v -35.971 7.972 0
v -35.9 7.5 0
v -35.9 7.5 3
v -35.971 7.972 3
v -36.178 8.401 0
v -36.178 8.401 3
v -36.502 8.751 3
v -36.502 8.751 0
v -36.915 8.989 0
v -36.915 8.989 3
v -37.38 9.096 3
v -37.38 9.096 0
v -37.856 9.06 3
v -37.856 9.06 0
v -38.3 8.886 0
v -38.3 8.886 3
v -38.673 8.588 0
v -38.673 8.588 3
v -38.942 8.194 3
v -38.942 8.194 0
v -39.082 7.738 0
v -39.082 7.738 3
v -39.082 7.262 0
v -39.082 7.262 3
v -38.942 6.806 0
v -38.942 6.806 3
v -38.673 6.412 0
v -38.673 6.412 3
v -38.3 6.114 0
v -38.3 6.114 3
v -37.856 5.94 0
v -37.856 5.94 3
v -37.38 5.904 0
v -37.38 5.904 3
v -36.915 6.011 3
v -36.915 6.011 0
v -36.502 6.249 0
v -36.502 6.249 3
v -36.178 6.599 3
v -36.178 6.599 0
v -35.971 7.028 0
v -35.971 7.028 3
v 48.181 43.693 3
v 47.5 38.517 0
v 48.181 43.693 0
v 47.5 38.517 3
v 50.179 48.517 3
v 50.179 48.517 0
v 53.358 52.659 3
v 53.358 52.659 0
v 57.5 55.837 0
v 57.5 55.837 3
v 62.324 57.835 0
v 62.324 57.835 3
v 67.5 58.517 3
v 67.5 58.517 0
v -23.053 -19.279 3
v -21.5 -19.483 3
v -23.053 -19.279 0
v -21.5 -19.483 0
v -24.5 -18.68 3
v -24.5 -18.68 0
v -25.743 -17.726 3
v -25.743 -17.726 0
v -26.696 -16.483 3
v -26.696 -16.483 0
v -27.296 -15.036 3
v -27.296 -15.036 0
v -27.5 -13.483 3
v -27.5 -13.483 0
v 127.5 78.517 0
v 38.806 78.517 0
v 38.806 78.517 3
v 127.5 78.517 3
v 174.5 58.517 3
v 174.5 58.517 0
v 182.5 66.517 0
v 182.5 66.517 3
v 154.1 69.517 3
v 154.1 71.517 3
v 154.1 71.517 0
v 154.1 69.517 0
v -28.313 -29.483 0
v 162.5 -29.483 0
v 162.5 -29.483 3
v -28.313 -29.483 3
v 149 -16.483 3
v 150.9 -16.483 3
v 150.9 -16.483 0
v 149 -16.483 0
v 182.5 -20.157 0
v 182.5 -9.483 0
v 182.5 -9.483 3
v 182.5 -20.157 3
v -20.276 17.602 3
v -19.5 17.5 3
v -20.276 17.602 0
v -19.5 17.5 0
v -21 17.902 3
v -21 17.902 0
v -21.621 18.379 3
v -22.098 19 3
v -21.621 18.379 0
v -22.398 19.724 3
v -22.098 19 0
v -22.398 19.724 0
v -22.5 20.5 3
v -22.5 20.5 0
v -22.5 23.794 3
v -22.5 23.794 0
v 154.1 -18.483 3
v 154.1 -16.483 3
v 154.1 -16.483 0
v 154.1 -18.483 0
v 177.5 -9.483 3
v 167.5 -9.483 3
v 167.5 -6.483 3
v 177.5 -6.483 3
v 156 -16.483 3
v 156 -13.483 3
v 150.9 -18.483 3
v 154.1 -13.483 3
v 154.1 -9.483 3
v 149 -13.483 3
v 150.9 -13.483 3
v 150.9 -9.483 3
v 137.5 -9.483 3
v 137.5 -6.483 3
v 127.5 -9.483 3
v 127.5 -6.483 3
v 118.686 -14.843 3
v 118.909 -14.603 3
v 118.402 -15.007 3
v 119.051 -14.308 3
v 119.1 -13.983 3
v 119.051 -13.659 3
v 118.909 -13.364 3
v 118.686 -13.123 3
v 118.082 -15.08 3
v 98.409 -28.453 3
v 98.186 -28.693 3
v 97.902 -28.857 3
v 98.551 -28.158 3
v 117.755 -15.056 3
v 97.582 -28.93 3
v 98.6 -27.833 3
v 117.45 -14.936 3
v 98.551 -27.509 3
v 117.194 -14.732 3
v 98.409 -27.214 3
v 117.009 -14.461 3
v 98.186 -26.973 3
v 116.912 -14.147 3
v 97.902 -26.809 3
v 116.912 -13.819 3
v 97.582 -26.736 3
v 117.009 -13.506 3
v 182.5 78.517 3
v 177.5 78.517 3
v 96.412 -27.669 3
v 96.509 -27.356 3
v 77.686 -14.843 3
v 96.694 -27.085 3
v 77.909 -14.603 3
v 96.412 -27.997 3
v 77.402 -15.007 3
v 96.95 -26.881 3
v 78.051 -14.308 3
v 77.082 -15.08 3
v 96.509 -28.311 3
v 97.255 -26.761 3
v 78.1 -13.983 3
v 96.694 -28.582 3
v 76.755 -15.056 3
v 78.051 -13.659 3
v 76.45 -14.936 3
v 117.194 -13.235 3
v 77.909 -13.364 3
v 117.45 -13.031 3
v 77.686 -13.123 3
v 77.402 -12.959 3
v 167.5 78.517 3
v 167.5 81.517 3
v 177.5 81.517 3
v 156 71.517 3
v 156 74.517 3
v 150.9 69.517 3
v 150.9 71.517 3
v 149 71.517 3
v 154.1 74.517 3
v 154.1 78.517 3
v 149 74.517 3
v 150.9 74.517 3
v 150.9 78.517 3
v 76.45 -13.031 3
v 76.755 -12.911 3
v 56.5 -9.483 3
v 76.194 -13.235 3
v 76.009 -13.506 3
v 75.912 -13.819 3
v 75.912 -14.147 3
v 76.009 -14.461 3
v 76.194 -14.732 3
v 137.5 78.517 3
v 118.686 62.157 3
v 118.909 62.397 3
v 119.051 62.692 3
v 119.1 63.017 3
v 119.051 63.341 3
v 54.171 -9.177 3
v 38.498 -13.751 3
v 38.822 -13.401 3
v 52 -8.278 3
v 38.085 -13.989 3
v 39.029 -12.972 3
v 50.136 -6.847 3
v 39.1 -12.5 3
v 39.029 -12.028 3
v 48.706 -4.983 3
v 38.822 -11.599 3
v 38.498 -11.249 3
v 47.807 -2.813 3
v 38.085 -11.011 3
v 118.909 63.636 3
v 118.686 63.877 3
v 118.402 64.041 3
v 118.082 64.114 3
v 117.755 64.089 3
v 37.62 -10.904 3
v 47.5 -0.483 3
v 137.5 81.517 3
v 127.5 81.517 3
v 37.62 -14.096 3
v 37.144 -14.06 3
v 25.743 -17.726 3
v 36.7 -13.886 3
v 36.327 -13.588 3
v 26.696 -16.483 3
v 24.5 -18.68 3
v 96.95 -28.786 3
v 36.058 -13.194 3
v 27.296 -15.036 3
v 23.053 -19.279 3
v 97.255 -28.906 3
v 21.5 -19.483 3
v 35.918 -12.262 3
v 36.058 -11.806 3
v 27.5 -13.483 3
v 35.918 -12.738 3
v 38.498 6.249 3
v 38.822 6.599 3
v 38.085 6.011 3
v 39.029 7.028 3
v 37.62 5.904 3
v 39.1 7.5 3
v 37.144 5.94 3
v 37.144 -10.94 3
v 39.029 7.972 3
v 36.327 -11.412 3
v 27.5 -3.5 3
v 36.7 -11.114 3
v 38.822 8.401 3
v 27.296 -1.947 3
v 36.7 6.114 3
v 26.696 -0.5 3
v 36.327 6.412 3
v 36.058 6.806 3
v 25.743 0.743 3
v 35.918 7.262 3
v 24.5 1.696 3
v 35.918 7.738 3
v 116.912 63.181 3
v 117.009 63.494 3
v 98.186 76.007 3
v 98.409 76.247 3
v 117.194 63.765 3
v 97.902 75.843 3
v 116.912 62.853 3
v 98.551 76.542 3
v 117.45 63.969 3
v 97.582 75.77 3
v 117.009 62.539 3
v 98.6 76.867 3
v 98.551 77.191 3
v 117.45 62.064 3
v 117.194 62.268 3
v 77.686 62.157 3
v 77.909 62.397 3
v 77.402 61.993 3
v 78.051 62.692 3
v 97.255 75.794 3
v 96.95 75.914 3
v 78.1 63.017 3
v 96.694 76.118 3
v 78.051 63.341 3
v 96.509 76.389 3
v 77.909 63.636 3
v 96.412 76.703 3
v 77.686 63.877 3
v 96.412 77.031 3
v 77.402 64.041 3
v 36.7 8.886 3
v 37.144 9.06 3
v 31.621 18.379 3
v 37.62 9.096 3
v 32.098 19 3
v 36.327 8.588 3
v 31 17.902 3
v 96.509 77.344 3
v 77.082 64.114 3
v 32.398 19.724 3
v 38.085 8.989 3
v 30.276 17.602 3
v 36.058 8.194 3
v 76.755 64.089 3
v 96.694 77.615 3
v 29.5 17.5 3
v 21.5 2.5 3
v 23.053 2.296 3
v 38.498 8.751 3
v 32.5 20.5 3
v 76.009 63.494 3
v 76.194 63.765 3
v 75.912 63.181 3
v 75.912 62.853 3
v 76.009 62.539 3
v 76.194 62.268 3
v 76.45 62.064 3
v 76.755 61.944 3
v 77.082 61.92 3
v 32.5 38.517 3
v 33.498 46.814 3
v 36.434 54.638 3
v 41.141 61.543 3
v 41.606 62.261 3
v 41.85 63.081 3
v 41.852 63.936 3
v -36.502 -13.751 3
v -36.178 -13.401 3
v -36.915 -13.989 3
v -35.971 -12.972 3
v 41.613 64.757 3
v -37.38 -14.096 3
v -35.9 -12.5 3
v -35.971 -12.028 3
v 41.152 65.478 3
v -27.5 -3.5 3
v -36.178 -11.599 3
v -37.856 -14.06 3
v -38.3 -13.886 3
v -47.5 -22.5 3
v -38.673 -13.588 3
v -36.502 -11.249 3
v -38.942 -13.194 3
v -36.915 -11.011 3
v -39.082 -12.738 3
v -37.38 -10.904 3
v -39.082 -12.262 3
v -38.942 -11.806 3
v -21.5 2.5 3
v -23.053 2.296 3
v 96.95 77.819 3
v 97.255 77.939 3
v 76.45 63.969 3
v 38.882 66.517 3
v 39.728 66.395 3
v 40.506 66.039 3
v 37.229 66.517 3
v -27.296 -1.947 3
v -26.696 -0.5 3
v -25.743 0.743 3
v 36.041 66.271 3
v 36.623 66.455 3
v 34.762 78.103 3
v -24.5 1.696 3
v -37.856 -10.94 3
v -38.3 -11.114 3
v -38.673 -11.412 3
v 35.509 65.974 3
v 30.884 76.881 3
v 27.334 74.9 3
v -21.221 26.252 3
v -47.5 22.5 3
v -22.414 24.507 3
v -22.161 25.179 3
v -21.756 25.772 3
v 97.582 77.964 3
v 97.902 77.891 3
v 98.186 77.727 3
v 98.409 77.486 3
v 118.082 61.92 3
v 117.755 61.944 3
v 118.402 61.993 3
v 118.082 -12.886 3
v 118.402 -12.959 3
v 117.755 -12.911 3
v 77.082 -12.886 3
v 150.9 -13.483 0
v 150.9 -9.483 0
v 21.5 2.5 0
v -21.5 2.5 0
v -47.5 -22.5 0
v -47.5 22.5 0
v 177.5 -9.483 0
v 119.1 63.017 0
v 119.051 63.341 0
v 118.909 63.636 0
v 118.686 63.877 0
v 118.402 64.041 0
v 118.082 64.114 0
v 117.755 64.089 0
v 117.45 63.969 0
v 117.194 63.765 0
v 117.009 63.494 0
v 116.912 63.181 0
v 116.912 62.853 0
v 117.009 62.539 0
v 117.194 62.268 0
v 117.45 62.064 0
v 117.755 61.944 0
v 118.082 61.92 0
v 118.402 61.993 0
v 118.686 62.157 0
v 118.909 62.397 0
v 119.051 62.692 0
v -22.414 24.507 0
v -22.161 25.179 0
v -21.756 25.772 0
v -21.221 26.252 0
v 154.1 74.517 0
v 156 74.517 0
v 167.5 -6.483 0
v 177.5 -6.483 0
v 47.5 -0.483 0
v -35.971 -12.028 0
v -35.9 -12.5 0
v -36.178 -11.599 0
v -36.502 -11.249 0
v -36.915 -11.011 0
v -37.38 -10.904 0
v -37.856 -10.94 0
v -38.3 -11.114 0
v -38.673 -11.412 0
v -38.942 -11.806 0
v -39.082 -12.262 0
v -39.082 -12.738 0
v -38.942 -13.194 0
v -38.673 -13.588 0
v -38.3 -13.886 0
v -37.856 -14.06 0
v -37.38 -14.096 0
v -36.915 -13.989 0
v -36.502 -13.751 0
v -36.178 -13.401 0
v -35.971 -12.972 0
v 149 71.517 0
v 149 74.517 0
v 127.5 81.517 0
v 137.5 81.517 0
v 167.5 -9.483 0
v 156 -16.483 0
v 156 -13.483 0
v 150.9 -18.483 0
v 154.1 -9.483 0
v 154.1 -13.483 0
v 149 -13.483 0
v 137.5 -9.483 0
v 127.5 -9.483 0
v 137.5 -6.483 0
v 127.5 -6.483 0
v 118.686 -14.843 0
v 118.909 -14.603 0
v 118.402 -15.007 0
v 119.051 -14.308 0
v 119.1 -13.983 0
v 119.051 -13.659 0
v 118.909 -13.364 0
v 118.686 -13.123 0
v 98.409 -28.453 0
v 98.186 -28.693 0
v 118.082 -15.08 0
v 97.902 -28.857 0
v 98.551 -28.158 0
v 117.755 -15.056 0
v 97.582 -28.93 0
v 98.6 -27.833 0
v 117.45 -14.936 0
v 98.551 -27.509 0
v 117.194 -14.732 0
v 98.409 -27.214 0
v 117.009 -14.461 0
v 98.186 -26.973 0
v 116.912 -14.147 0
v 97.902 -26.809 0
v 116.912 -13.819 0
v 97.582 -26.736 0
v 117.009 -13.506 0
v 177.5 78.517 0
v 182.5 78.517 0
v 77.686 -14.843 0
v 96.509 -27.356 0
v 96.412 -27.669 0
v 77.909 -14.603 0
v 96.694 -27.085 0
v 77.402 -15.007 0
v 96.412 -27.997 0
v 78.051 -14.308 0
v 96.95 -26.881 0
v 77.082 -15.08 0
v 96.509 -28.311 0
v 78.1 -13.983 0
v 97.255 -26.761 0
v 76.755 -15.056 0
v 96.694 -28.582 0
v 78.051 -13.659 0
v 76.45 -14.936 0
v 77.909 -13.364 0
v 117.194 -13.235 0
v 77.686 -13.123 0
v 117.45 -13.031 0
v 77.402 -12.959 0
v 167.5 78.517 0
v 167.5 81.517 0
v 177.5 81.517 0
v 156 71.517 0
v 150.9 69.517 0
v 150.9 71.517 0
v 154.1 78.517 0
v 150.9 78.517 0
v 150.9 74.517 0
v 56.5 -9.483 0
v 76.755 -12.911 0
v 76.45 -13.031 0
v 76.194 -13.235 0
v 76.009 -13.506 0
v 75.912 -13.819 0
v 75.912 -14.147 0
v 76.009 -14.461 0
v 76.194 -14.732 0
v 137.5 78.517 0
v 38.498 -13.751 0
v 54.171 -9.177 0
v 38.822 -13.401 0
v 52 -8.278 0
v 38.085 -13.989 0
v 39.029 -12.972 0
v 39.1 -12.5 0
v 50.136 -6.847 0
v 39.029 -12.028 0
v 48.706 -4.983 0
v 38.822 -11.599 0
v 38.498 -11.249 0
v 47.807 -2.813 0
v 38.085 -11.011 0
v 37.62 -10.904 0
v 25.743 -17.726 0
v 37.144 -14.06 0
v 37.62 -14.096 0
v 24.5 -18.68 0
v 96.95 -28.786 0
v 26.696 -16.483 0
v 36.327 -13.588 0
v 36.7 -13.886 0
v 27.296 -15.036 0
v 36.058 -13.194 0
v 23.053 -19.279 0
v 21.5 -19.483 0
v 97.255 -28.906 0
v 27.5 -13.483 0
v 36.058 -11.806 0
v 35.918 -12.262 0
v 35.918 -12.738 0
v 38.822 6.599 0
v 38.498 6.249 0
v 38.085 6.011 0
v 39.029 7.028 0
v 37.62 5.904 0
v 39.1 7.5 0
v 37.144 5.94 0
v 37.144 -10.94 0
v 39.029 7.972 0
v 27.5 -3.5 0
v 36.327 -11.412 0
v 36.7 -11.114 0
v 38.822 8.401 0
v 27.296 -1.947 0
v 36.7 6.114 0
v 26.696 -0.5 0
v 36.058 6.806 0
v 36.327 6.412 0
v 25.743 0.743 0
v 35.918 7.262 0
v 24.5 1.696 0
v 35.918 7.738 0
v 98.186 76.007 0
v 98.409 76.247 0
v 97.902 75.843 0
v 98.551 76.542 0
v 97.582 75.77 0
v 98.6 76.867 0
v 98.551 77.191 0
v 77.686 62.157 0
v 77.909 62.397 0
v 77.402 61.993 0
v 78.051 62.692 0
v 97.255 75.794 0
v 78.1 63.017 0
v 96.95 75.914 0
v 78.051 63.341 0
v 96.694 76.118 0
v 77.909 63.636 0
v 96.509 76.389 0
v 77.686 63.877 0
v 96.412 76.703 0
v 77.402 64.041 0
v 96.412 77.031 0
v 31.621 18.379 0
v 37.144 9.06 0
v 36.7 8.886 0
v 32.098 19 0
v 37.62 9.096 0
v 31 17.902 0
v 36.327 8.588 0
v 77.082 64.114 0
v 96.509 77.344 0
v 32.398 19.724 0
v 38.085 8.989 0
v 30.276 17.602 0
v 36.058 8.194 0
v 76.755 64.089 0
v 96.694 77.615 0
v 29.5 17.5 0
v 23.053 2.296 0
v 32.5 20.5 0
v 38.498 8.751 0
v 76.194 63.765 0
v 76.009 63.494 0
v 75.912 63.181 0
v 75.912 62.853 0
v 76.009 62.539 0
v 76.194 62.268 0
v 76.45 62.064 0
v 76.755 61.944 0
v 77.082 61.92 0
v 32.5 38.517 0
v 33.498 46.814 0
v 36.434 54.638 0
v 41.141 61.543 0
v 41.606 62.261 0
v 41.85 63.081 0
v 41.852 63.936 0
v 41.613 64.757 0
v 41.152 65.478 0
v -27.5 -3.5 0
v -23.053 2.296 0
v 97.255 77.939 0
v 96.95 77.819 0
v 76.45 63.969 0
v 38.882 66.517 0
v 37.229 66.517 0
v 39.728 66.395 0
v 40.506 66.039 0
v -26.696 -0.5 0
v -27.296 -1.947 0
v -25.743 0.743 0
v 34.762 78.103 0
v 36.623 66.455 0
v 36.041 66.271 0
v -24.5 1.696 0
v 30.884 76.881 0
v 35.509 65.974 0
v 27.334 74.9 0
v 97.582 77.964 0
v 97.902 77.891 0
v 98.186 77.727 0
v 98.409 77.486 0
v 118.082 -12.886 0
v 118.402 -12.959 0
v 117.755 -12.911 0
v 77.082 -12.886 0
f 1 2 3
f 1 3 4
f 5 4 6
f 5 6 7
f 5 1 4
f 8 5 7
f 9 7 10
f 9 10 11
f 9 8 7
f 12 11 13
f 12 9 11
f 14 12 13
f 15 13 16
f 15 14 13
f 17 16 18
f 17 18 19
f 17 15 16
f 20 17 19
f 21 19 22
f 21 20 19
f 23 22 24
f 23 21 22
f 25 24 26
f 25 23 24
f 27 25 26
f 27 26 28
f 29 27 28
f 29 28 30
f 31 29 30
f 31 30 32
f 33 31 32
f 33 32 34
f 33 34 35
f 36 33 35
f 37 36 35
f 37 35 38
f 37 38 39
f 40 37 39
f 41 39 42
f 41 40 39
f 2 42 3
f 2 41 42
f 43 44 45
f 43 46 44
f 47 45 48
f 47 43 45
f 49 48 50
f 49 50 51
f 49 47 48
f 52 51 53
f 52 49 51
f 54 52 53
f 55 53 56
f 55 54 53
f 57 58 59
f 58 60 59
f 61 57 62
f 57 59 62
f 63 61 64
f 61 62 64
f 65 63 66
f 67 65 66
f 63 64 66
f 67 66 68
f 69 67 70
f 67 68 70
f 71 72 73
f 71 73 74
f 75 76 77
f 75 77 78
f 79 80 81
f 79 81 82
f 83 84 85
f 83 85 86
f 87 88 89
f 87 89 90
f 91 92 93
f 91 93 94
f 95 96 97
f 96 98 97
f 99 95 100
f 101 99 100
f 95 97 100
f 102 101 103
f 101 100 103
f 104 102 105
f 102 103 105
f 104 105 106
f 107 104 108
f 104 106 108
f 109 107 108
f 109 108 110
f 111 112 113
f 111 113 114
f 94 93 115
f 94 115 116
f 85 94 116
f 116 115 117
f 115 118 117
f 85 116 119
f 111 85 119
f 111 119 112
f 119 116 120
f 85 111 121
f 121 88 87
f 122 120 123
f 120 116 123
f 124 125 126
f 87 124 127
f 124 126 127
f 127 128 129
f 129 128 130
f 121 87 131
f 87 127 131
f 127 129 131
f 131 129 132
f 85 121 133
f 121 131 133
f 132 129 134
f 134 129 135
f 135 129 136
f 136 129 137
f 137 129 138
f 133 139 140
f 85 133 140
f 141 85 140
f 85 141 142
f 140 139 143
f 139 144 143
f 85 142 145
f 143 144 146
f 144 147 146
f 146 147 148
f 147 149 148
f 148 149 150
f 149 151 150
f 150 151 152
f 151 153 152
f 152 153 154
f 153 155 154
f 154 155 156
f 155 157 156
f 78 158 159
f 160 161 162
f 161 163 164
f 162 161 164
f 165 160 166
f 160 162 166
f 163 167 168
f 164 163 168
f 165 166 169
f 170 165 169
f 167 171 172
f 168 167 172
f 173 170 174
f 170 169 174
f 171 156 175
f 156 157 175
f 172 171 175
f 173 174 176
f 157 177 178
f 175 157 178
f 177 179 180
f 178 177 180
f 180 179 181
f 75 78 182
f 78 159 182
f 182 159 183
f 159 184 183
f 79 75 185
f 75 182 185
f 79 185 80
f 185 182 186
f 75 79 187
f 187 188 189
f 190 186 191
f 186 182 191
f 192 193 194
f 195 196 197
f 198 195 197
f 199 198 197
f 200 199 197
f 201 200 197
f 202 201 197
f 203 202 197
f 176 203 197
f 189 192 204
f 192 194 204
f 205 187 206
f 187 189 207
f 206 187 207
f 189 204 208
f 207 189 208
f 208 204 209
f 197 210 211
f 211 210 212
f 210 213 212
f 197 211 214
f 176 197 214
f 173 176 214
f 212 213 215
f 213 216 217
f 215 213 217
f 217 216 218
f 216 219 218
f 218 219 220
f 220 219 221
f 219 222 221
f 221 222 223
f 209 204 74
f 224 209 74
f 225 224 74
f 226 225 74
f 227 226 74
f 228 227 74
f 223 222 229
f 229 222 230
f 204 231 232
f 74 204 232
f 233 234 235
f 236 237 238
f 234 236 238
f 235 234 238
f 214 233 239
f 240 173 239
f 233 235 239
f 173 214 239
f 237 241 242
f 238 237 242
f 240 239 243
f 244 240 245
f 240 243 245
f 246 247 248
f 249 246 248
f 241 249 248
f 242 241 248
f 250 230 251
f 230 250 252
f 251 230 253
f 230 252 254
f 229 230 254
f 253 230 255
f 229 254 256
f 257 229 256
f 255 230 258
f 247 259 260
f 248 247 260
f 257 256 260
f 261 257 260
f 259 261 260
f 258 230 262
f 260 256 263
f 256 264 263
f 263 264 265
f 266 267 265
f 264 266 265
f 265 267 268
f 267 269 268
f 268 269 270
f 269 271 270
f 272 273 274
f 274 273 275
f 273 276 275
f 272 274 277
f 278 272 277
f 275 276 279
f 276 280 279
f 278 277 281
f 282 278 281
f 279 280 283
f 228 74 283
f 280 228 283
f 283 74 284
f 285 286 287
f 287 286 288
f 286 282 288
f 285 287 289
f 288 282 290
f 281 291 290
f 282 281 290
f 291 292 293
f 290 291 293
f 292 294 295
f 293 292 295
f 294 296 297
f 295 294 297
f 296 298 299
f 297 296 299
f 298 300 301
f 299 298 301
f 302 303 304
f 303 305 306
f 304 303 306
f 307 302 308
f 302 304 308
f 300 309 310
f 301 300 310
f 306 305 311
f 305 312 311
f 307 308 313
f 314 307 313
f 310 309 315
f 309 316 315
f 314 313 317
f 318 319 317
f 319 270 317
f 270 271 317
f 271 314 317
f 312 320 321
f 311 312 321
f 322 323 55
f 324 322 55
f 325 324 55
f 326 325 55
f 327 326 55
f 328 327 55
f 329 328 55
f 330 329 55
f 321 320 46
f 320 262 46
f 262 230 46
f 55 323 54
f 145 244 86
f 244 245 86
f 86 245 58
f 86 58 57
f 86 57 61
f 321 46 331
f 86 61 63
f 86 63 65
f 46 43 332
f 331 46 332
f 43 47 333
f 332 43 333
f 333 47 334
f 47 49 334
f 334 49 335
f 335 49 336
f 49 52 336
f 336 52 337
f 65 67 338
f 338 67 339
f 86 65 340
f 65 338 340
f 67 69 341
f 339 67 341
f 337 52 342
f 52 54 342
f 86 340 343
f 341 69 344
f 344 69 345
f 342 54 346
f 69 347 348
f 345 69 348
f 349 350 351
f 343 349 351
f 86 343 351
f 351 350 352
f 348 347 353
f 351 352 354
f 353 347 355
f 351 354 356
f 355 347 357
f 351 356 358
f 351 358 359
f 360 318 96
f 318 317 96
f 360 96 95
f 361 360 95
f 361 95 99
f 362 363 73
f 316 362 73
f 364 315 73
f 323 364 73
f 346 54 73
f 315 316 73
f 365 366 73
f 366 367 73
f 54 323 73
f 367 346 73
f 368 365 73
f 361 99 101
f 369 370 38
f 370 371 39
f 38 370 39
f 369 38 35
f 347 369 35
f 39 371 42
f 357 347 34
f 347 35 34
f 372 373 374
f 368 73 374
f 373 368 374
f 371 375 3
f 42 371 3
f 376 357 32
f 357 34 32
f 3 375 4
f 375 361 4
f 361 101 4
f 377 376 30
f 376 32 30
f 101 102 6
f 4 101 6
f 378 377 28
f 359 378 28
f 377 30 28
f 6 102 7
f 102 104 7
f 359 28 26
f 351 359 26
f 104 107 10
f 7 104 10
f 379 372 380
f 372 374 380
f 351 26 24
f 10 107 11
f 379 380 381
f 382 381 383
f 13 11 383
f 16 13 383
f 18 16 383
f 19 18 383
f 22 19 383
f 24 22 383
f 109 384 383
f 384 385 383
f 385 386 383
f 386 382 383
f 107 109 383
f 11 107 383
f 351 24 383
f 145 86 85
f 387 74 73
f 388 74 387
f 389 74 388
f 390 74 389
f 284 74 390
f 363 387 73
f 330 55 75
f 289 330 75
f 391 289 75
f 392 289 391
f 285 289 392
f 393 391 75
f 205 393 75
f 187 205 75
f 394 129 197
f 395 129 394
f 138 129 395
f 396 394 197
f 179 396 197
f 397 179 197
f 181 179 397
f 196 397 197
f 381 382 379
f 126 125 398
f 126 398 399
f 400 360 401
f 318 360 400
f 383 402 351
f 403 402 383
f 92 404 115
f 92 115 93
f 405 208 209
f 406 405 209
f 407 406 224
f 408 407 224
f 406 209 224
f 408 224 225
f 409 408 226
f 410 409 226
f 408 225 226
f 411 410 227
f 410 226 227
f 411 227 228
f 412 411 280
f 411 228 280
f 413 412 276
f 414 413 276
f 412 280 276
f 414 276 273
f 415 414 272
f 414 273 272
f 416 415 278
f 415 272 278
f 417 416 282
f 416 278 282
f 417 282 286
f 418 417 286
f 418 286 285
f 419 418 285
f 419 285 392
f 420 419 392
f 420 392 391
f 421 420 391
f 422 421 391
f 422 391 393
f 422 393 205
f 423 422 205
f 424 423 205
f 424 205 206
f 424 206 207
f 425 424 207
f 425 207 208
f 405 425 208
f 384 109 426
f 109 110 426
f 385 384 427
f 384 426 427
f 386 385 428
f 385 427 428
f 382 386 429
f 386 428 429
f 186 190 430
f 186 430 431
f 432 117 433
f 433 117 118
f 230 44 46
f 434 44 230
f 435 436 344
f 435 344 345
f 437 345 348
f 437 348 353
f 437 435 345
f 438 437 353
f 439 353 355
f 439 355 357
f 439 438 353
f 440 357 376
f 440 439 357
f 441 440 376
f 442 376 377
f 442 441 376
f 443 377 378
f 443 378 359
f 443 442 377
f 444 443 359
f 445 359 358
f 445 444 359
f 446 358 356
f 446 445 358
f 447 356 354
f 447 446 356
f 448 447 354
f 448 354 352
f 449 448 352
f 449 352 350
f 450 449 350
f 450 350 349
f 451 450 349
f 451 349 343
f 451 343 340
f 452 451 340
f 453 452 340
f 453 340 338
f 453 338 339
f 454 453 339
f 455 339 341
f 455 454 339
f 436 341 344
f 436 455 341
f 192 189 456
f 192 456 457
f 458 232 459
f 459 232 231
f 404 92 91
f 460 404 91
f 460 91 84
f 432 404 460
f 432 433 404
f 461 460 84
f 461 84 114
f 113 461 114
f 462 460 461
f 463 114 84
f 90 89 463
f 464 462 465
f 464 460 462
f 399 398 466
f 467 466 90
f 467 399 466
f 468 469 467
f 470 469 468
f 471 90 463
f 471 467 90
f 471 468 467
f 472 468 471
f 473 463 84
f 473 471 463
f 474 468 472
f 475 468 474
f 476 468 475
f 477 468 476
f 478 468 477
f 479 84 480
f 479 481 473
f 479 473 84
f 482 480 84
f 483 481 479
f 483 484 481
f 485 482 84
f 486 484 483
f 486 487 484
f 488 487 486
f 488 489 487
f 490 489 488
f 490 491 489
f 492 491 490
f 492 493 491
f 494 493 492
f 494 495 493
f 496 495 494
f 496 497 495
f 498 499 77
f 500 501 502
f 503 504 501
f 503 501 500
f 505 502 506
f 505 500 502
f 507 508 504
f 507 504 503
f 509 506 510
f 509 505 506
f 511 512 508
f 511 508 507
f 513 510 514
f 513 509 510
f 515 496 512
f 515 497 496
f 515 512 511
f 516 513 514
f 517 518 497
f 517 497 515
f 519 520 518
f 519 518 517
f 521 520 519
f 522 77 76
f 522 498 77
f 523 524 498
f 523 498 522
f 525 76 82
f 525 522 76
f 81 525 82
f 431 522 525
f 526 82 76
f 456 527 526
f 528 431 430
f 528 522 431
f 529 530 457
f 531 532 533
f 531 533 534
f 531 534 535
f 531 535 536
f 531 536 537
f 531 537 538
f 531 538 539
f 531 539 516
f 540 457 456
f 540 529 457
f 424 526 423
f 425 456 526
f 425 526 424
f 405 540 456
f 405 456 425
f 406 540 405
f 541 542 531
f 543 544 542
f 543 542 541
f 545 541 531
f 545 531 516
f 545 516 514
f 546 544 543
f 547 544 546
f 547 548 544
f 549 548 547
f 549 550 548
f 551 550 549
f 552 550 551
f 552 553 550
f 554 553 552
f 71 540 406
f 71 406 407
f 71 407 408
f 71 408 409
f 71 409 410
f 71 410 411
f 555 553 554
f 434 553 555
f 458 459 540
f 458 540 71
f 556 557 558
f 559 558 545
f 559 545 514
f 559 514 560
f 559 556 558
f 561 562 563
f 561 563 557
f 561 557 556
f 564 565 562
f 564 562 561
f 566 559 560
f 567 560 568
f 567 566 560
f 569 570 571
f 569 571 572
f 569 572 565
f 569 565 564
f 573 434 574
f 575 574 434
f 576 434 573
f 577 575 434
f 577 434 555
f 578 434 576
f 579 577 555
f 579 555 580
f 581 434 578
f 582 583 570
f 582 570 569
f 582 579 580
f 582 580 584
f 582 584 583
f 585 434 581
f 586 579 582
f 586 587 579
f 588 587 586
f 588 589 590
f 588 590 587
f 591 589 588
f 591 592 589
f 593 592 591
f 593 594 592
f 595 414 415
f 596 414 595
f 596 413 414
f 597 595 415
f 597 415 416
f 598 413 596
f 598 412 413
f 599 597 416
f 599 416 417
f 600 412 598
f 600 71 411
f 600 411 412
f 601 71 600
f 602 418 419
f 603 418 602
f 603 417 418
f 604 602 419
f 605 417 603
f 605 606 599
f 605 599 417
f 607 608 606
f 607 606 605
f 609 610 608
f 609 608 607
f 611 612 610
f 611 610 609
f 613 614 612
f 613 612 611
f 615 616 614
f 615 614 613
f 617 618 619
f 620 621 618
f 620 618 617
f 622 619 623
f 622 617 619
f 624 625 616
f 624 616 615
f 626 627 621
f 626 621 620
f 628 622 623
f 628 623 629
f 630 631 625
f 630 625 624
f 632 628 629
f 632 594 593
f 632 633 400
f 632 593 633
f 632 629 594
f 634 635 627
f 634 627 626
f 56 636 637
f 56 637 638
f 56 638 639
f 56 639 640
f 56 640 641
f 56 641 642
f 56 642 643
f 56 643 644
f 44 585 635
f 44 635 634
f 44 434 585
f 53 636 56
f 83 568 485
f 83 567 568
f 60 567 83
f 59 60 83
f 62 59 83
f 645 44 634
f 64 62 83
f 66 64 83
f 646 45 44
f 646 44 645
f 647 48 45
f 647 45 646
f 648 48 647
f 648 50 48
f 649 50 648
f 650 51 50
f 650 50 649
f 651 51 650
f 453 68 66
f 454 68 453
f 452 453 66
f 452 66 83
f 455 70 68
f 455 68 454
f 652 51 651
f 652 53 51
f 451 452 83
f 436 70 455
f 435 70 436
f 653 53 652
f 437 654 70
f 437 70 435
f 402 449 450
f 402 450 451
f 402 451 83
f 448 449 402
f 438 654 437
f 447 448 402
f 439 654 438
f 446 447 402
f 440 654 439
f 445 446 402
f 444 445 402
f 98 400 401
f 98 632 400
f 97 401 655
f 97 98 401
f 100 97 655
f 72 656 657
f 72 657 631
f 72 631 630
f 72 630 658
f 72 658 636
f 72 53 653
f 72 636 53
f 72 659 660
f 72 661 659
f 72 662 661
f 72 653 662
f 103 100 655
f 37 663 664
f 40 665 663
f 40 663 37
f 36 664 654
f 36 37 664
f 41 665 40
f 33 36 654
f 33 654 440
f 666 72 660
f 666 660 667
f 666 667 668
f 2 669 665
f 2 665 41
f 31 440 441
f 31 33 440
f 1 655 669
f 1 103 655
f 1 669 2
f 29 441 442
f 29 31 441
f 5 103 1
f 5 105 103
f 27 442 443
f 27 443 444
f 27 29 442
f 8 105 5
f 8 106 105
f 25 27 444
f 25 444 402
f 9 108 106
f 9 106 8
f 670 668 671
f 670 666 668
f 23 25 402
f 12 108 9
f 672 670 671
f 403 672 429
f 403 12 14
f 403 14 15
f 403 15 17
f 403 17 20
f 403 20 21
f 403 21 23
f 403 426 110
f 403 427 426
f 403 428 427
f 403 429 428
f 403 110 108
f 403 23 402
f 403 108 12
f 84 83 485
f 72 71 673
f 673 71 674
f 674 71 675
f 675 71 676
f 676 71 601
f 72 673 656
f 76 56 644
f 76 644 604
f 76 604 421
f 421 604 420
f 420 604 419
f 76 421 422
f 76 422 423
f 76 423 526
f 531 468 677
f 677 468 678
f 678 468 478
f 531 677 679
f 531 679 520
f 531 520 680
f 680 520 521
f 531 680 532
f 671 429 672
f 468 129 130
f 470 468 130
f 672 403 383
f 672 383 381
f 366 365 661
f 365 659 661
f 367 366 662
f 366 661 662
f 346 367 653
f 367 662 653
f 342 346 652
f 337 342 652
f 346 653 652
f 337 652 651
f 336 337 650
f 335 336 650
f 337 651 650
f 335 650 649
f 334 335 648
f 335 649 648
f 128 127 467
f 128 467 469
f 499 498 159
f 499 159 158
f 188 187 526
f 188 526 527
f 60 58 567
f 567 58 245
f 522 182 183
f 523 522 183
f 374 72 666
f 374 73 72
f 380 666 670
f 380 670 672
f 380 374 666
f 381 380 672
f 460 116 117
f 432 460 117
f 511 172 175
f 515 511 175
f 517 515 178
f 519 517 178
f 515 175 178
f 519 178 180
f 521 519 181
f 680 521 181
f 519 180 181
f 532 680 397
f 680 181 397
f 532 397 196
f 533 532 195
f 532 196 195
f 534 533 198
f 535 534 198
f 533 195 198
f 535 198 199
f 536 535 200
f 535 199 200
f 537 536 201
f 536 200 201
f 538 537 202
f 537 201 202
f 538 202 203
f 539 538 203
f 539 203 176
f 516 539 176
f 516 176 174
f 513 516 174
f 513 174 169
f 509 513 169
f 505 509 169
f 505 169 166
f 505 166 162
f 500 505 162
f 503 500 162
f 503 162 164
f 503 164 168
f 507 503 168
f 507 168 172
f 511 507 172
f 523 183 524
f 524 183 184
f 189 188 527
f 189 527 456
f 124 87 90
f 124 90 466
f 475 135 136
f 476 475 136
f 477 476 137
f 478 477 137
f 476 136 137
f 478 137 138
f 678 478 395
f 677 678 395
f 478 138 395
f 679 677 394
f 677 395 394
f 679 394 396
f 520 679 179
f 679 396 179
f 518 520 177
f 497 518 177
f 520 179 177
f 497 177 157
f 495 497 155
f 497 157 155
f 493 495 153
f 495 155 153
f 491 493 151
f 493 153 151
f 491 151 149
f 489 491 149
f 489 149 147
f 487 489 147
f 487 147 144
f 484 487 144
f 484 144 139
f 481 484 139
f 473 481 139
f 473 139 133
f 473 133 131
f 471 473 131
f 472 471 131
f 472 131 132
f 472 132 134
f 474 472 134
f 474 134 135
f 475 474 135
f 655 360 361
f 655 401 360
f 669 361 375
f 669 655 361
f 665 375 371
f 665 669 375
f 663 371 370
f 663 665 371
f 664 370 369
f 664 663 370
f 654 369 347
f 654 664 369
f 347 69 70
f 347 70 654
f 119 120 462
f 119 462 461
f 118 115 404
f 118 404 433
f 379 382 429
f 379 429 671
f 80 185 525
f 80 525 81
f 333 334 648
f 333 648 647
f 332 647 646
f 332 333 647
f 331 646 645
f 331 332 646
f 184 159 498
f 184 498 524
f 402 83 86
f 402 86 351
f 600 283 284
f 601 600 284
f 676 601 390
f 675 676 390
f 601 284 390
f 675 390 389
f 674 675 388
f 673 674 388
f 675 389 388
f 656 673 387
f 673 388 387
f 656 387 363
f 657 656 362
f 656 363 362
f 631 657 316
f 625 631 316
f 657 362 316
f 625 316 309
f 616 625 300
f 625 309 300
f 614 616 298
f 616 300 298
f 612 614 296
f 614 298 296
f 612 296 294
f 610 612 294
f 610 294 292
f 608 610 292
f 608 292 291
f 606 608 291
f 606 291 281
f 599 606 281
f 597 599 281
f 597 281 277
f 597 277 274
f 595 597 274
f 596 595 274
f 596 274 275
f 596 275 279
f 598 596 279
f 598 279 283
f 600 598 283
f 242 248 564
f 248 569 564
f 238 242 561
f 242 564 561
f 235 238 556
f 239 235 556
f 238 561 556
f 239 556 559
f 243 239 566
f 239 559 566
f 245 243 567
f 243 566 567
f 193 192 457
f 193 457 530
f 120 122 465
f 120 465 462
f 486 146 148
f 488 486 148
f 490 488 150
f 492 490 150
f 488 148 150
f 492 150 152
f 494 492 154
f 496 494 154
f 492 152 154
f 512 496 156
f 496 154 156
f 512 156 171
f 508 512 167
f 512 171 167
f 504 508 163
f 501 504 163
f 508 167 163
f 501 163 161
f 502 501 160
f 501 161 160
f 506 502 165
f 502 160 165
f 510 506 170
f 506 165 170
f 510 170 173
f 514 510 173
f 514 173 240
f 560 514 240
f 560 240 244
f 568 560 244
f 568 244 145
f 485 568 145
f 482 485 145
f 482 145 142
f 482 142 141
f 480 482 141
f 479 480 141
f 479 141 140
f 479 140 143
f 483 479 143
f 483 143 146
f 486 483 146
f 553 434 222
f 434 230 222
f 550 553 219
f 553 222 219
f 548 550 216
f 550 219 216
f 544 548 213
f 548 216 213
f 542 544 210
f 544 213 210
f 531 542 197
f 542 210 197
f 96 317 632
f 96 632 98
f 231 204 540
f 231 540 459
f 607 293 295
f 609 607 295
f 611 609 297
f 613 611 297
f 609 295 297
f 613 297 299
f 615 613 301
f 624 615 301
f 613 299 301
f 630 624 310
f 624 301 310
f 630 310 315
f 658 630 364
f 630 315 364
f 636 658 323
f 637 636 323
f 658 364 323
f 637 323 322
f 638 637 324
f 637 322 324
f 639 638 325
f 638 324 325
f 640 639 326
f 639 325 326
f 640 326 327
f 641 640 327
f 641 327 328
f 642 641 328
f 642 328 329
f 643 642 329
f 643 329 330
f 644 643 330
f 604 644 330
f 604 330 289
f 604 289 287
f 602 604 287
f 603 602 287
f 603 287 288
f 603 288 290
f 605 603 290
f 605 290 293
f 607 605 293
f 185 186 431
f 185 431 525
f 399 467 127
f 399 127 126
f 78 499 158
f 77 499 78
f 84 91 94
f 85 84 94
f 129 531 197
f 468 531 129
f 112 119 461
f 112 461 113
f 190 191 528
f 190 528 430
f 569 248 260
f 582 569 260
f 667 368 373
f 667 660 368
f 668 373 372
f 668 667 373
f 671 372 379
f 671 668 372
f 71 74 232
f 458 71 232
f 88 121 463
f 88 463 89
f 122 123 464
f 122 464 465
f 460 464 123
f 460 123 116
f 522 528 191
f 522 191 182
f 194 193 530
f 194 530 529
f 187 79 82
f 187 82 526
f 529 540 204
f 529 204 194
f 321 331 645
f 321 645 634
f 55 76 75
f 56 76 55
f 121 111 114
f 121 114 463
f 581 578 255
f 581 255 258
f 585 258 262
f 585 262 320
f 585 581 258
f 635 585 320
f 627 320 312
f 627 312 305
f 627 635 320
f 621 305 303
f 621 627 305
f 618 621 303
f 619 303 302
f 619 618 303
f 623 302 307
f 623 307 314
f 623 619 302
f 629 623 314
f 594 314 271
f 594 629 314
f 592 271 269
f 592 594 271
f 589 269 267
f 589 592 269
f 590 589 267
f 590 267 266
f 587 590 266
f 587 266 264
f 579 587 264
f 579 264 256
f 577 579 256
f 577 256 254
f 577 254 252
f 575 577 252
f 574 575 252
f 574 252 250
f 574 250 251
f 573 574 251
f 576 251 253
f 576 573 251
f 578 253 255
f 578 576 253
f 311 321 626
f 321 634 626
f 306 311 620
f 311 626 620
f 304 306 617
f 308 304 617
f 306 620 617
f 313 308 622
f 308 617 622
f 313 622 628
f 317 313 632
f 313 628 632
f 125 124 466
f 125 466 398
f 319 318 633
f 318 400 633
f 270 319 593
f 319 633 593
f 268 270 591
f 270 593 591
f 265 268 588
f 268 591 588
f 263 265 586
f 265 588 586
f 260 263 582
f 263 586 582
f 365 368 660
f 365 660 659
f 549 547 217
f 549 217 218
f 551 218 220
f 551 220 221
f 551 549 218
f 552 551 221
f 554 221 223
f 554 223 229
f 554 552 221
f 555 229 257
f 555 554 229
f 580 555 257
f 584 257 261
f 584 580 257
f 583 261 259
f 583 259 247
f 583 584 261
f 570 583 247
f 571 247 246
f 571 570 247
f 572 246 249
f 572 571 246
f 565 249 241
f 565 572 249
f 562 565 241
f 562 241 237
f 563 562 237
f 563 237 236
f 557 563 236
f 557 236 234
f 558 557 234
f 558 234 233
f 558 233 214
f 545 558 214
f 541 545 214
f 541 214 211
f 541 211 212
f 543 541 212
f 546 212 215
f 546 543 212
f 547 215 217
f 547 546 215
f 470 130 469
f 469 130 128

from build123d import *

# Parameters (mm, degrees)
SKETCH_1_R          = 1.6
EXTRUDE_1_DEPTH     = 3
SKETCH_4_W          = 10
SKETCH_4_H          = 3
EXTRUDE_2_DEPTH     = 3
SKETCH_5_R          = 1.1
CUT_EXTRUDE_1_DEPTH = 200.90049168
FILLET_1_R          = 20
FILLET_2_R          = 9
SKETCH_6_W          = 55
SKETCH_6_H          = 21.983396943
CUT_EXTRUDE_2_DEPTH = 200.90049168
FILLET_3_R          = 6
FILLET_4_R          = 3
FILLET_5_R          = 20
CHAMFER_1_SIZE      = 8
CHAMFER_3_SIZE      = 20
CHAMFER_3_SIZE2     = 9.326153163


with BuildPart() as part:
    # 草图1 → 凸台-拉伸1 (new body)
    with BuildSketch(Plane.XY):
        Polygon((-47.5, -22.5), (-47.5, 22.5), (32.5, 78.516603057), (182.5, 78.516603057), (182.5, 58.516603057), (47.5, 58.516603057), (47.5, -9.483396943), (182.5, -9.483396943), (182.5, -29.483396943), (-28.313274587, -29.483396943), align=None)
        with Locations((-37.5, 7.5)):
            Circle(SKETCH_1_R, mode=Mode.SUBTRACT)
        with Locations((-37.5, -12.5)):
            Circle(SKETCH_1_R, mode=Mode.SUBTRACT)
        with Locations((37.5, 7.5)):
            Circle(SKETCH_1_R, mode=Mode.SUBTRACT)
        with Locations((37.5, -12.5)):
            Circle(SKETCH_1_R, mode=Mode.SUBTRACT)
    extrude(amount=EXTRUDE_1_DEPTH)

    # 草图4 → 凸台-拉伸2 (add)
    with BuildSketch(Plane.XY.offset(3)):
        with Locations((132.5, 80.016603057)):
            Rectangle(SKETCH_4_W, SKETCH_4_H)
        with Locations((172.5, 80.016603057)):
            Rectangle(SKETCH_4_W, SKETCH_4_H)
        with Locations((132.5, -7.983396943)):
            Rectangle(SKETCH_4_W, SKETCH_4_H)
        with Locations((172.5, -7.983396943)):
            Rectangle(SKETCH_4_W, SKETCH_4_H)
    extrude(amount=-EXTRUDE_2_DEPTH)

    # 草图5 → 切除-拉伸1 (cut, through all)
    with BuildSketch(Plane.XY.offset(3)):
        with Locations((77, -13.983396943)):
            Circle(SKETCH_5_R)
        with Locations((118, -13.983396943)):
            Circle(SKETCH_5_R)
        with Locations((97.5, -27.833396943)):
            Circle(SKETCH_5_R)
        with Locations((77, 63.016603057)):
            Circle(SKETCH_5_R)
        with Locations((118, 63.016603057)):
            Circle(SKETCH_5_R)
        with Locations((97.5, 76.866603057)):
            Circle(SKETCH_5_R)
        Polygon((150.9, 78.516603057), (154.1, 78.516603057), (154.1, 74.516603057), (156, 74.516603057), (156, 71.516603057), (154.1, 71.516603057), (154.1, 69.516603057), (150.9, 69.516603057), (150.9, 71.516603057), (149, 71.516603057), (149, 74.516603057), (150.9, 74.516603057), align=None)
        Polygon((150.9, -9.483396943), (154.1, -9.483396943), (154.1, -13.483396943), (156, -13.483396943), (156, -16.483396943), (154.1, -16.483396943), (154.1, -18.483396943), (150.9, -18.483396943), (150.9, -16.483396943), (149, -16.483396943), (149, -13.483396943), (150.9, -13.483396943), align=None)
    extrude(amount=-CUT_EXTRUDE_1_DEPTH, mode=Mode.SUBTRACT)

    # 圆角1
    fillet_1_edges = [part.edges().sort_by_distance(p)[0] for p in [
        (47.5, 58.516603057, 1.5),
    ]]
    fillet(fillet_1_edges, radius=FILLET_1_R)

    # 圆角2
    fillet_2_edges = [part.edges().sort_by_distance(p)[0] for p in [
        (47.5, -9.483396943, 1.5),
    ]]
    fillet(fillet_2_edges, radius=FILLET_2_R)

    # 草图6 → 切除-拉伸2 (cut, through all)
    with BuildSketch(Plane.XY.offset(3)):
        with BuildLine():
            Line((-22.5, 25.35589339), (36.283585467, 66.516603057))
            Line((36.283585467, 66.516603057), (46.5, 66.516603057))
            ThreePointArc((46.5, 66.516603057), (36.195048315, 54.169078899), (32.5, 38.516603057))
            Line((32.5, 38.516603057), (32.5, 17.5))
            Line((32.5, 17.5), (-22.5, 17.5))
            Line((-22.5, 17.5), (-22.5, 25.35589339))
        make_face()
        with Locations((0, -8.491698472)):
            Rectangle(SKETCH_6_W, SKETCH_6_H)
    extrude(amount=-CUT_EXTRUDE_2_DEPTH, mode=Mode.SUBTRACT)

    # 圆角3
    fillet_3_edges = [part.edges().sort_by_distance(p)[0] for p in [
        (27.5, 2.5, 1.5),
        (27.5, -19.483396943, 1.5),
        (-27.5, -19.483396943, 1.5),
        (-27.5, 2.5, 1.5),
    ]]
    fillet(fillet_3_edges, radius=FILLET_3_R)

    # 圆角4
    fillet_4_edges = [part.edges().sort_by_distance(p)[0] for p in [
        (-22.5, 17.5, 1.5),
        (-22.5, 25.35589339, 1.5),
        (36.283585467, 66.516603057, 1.5),
        (46.5, 66.516603057, 1.5),
        (32.5, 17.5, 1.5),
    ]]
    fillet(fillet_4_edges, radius=FILLET_4_R)

    # 圆角5
    fillet_5_edges = [part.edges().sort_by_distance(p)[0] for p in [
        (32.5, 78.516603057, 1.5),
    ]]
    fillet(fillet_5_edges, radius=FILLET_5_R)

    # 倒角1
    chamfer_1_edges = [part.edges().sort_by_distance(p)[0] for p in [
        (182.5, 58.516603057, 1.5),
    ]]
    chamfer(chamfer_1_edges, length=CHAMFER_1_SIZE)

    # 倒角3
    chamfer_3_edges = [part.edges().sort_by_distance(p)[0] for p in [
        (182.5, -29.483396943, 1.5),
    ]]
    chamfer_3_side = [part.faces().sort_by_distance(p)[0] for p in [
        (77.093362706, -29.483396943, 1.5),
    ]]
    chamfer(chamfer_3_edges, length=CHAMFER_3_SIZE, length2=CHAMFER_3_SIZE2, reference=chamfer_3_side[0])


solid = part.part
